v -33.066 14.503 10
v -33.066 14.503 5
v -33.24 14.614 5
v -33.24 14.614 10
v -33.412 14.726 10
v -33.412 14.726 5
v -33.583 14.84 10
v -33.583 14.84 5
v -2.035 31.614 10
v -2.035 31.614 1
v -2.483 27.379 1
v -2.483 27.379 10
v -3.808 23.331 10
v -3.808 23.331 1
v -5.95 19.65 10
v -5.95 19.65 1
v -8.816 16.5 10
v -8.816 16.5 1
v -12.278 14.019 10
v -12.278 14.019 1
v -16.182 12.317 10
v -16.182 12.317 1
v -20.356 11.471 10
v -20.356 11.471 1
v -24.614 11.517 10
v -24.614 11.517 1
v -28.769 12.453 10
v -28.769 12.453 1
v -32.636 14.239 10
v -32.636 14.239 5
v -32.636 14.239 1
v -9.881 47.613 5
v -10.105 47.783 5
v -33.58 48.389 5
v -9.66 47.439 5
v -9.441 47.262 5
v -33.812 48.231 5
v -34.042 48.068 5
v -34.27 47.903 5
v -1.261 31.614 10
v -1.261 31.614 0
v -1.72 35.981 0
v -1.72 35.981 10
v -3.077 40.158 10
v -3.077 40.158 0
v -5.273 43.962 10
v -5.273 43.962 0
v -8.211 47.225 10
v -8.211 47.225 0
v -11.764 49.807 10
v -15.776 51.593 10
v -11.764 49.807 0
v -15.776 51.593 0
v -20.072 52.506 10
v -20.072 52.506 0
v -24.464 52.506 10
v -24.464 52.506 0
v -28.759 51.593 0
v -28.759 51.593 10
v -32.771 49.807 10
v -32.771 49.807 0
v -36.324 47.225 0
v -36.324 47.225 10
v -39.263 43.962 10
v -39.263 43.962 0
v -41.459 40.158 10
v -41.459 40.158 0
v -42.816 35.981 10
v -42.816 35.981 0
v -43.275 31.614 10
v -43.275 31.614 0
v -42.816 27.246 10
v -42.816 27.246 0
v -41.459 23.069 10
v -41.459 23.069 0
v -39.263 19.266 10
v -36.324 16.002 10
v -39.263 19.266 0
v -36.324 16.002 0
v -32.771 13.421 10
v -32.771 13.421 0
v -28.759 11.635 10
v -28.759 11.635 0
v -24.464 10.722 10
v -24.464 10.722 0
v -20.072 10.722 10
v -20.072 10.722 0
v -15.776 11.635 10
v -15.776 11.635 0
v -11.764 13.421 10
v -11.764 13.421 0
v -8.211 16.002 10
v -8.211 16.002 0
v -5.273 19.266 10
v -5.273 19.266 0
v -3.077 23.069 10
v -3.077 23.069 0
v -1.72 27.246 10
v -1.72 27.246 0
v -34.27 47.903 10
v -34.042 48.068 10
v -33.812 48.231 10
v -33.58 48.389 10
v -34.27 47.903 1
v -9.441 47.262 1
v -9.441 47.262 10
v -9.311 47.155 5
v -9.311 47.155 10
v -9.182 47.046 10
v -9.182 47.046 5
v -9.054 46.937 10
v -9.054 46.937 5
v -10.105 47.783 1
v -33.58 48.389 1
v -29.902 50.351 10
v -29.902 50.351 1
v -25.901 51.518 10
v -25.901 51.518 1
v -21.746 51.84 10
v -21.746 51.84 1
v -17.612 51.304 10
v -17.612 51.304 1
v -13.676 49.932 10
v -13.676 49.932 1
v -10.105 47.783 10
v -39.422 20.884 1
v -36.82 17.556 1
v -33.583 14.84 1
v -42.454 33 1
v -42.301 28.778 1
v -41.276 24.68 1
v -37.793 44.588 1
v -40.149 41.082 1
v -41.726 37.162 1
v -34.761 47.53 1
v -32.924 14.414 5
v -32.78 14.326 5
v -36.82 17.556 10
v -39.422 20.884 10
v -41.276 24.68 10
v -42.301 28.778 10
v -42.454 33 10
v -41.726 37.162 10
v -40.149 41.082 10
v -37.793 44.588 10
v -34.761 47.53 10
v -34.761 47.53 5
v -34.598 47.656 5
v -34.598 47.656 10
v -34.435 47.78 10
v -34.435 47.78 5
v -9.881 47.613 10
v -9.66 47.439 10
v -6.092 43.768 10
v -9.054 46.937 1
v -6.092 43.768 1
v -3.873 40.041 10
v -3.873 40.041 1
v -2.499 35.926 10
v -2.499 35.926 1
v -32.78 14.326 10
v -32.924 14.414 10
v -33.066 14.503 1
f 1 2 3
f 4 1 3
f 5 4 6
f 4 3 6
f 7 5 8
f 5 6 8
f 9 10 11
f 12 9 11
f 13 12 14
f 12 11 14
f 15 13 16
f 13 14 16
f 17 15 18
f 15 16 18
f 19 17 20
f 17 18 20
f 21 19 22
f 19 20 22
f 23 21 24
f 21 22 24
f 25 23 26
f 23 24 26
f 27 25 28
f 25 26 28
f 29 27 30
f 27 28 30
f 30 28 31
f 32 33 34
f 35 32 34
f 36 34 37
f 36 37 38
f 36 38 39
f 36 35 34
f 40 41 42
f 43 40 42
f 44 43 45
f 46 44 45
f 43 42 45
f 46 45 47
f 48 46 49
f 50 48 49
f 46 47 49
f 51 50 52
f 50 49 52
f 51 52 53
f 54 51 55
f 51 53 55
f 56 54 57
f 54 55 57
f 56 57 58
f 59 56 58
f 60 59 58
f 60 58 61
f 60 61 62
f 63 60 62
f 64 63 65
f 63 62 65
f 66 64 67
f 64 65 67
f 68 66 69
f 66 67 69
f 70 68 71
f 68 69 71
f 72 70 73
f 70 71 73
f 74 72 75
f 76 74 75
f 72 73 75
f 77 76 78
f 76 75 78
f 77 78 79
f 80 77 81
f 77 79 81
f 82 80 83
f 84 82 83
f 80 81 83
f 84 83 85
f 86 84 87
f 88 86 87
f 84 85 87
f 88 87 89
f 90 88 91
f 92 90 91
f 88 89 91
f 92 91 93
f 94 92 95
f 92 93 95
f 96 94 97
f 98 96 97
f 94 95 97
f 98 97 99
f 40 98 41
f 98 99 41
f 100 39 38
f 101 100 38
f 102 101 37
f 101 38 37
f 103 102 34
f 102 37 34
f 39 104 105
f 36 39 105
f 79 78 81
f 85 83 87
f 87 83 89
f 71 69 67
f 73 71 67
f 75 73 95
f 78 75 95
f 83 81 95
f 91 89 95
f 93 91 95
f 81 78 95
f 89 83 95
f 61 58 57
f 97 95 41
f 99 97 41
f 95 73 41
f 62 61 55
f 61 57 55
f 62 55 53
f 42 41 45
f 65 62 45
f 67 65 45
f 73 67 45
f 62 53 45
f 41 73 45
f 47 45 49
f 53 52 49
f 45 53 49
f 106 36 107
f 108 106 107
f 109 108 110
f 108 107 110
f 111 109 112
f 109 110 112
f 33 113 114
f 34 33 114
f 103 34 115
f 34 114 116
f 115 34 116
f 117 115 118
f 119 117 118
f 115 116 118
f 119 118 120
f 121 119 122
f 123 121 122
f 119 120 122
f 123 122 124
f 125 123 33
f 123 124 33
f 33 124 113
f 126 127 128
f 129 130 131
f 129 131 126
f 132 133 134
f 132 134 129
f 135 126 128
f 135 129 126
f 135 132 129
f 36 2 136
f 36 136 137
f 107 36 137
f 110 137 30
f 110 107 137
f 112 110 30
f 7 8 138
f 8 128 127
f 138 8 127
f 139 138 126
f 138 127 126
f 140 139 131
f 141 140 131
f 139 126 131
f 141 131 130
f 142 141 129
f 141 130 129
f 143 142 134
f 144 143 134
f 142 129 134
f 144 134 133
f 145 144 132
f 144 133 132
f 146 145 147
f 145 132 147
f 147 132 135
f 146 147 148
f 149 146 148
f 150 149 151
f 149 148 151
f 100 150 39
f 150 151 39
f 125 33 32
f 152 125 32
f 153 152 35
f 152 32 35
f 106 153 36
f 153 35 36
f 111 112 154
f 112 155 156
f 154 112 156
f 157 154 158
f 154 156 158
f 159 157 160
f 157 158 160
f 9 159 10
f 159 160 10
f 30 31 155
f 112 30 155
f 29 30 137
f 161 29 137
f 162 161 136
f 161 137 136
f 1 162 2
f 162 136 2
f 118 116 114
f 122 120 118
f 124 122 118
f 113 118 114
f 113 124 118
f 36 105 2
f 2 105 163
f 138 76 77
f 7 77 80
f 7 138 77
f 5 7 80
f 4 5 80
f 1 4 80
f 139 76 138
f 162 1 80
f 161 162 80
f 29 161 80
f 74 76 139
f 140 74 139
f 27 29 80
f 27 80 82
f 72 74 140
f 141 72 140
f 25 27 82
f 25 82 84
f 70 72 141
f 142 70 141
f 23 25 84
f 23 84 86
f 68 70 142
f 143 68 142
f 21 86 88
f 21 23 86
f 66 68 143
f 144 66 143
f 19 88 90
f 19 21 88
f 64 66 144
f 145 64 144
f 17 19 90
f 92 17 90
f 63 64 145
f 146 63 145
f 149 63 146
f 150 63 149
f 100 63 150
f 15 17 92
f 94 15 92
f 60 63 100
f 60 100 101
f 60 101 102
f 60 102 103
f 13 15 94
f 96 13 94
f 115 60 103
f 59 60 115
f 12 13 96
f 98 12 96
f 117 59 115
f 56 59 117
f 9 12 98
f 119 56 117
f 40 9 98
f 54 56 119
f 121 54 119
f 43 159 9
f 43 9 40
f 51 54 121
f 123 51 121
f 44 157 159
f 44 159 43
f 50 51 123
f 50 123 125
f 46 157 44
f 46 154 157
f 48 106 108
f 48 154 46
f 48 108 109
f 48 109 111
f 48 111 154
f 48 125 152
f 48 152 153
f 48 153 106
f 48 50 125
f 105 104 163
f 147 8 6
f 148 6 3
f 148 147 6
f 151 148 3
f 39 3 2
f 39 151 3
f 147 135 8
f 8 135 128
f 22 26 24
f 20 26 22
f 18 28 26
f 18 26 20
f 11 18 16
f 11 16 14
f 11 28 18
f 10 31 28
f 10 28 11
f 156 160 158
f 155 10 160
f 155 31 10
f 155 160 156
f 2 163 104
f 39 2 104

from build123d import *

# Parameters (mm, degrees)
F0_R     = 21.007285
F1_DEPTH = 10
F2_DEPTH = 5
F3_DEPTH = 1


with BuildPart() as f1:
    # F0 (on Top) → F1 (new body)
    with BuildSketch(Plane.XY):
        with Locations((-22.267804, 31.613778)):
            Circle(F0_R)
        with BuildLine():
            ThreePointArc((-9.054285, 46.93661), (-3.872977, 40.040914), (-2.034508, 31.613778))
            ThreePointArc((-2.034508, 31.613778), (-12.277525, 14.018876), (-32.635611, 14.238658))
            ThreePointArc((-32.635611, 14.238658), (-32.851833, 14.369517), (-33.066404, 14.503066))
            ThreePointArc((-33.066404, 14.503066), (-33.325959, 14.669652), (-33.582945, 14.840174))
            ThreePointArc((-33.582945, 14.840174), (-42.48798, 30.885292), (-34.760672, 47.529634))
            ThreePointArc((-34.760672, 47.529634), (-34.516623, 47.718208), (-34.269729, 47.90304))
            ThreePointArc((-34.269729, 47.90304), (-33.927332, 48.149849), (-33.579861, 48.389463))
            ThreePointArc((-33.579861, 48.389463), (-21.7455, 51.840331), (-10.105014, 47.78328))
            ThreePointArc((-10.105014, 47.78328), (-9.770373, 47.526052), (-9.441171, 47.2619))
            ThreePointArc((-9.441171, 47.2619), (-9.246712, 47.100463), (-9.054285, 46.93661))
        make_face(mode=Mode.SUBTRACT)
    extrude(amount=F1_DEPTH)

    # F0 (on Top) → F2 (join)
    with BuildSketch(Plane.XY):
        with BuildLine():
            Line((-34.269729, 47.90304), (-9.441171, 47.2619))
            ThreePointArc((-9.441171, 47.2619), (-9.770373, 47.526052), (-10.105014, 47.78328))
            Line((-10.105014, 47.78328), (-33.579861, 48.389463))
            ThreePointArc((-33.579861, 48.389463), (-33.927332, 48.149849), (-34.269729, 47.90304))
        make_face()
        with BuildLine():
            Line((-32.635611, 14.238658), (-9.054285, 46.93661))
            ThreePointArc((-9.054285, 46.93661), (-9.246712, 47.100463), (-9.441171, 47.2619))
            Line((-9.441171, 47.2619), (-33.066404, 14.503066))
            ThreePointArc((-33.066404, 14.503066), (-32.851833, 14.369517), (-32.635611, 14.238658))
        make_face()
        with BuildLine():
            ThreePointArc((-33.582945, 14.840174), (-33.325959, 14.669652), (-33.066404, 14.503066))
            Line((-33.066404, 14.503066), (-34.269729, 47.90304))
            ThreePointArc((-34.269729, 47.90304), (-34.516623, 47.718208), (-34.760672, 47.529634))
            Line((-34.760672, 47.529634), (-33.582945, 14.840174))
        make_face()
    extrude(amount=F2_DEPTH)

    # F0 (on Top) → F3 (join)
    with BuildSketch(Plane.XY):
        Polygon((-33.066404, 14.503066), (-9.441171, 47.2619), (-34.269729, 47.90304), align=None)
        with BuildLine():
            Line((-33.579861, 48.389463), (-10.105014, 47.78328))
            ThreePointArc((-10.105014, 47.78328), (-21.7455, 51.840331), (-33.579861, 48.389463))
        make_face()
        with BuildLine():
            ThreePointArc((-32.635611, 14.238658), (-12.277525, 14.018876), (-2.034508, 31.613778))
            ThreePointArc((-2.034508, 31.613778), (-3.872977, 40.040914), (-9.054285, 46.93661))
            Line((-9.054285, 46.93661), (-32.635611, 14.238658))
        make_face()
        with BuildLine():
            ThreePointArc((-34.760672, 47.529634), (-42.48798, 30.885292), (-33.582945, 14.840174))
            Line((-33.582945, 14.840174), (-34.760672, 47.529634))
        make_face()
    extrude(amount=F3_DEPTH)


solid = f1.part
